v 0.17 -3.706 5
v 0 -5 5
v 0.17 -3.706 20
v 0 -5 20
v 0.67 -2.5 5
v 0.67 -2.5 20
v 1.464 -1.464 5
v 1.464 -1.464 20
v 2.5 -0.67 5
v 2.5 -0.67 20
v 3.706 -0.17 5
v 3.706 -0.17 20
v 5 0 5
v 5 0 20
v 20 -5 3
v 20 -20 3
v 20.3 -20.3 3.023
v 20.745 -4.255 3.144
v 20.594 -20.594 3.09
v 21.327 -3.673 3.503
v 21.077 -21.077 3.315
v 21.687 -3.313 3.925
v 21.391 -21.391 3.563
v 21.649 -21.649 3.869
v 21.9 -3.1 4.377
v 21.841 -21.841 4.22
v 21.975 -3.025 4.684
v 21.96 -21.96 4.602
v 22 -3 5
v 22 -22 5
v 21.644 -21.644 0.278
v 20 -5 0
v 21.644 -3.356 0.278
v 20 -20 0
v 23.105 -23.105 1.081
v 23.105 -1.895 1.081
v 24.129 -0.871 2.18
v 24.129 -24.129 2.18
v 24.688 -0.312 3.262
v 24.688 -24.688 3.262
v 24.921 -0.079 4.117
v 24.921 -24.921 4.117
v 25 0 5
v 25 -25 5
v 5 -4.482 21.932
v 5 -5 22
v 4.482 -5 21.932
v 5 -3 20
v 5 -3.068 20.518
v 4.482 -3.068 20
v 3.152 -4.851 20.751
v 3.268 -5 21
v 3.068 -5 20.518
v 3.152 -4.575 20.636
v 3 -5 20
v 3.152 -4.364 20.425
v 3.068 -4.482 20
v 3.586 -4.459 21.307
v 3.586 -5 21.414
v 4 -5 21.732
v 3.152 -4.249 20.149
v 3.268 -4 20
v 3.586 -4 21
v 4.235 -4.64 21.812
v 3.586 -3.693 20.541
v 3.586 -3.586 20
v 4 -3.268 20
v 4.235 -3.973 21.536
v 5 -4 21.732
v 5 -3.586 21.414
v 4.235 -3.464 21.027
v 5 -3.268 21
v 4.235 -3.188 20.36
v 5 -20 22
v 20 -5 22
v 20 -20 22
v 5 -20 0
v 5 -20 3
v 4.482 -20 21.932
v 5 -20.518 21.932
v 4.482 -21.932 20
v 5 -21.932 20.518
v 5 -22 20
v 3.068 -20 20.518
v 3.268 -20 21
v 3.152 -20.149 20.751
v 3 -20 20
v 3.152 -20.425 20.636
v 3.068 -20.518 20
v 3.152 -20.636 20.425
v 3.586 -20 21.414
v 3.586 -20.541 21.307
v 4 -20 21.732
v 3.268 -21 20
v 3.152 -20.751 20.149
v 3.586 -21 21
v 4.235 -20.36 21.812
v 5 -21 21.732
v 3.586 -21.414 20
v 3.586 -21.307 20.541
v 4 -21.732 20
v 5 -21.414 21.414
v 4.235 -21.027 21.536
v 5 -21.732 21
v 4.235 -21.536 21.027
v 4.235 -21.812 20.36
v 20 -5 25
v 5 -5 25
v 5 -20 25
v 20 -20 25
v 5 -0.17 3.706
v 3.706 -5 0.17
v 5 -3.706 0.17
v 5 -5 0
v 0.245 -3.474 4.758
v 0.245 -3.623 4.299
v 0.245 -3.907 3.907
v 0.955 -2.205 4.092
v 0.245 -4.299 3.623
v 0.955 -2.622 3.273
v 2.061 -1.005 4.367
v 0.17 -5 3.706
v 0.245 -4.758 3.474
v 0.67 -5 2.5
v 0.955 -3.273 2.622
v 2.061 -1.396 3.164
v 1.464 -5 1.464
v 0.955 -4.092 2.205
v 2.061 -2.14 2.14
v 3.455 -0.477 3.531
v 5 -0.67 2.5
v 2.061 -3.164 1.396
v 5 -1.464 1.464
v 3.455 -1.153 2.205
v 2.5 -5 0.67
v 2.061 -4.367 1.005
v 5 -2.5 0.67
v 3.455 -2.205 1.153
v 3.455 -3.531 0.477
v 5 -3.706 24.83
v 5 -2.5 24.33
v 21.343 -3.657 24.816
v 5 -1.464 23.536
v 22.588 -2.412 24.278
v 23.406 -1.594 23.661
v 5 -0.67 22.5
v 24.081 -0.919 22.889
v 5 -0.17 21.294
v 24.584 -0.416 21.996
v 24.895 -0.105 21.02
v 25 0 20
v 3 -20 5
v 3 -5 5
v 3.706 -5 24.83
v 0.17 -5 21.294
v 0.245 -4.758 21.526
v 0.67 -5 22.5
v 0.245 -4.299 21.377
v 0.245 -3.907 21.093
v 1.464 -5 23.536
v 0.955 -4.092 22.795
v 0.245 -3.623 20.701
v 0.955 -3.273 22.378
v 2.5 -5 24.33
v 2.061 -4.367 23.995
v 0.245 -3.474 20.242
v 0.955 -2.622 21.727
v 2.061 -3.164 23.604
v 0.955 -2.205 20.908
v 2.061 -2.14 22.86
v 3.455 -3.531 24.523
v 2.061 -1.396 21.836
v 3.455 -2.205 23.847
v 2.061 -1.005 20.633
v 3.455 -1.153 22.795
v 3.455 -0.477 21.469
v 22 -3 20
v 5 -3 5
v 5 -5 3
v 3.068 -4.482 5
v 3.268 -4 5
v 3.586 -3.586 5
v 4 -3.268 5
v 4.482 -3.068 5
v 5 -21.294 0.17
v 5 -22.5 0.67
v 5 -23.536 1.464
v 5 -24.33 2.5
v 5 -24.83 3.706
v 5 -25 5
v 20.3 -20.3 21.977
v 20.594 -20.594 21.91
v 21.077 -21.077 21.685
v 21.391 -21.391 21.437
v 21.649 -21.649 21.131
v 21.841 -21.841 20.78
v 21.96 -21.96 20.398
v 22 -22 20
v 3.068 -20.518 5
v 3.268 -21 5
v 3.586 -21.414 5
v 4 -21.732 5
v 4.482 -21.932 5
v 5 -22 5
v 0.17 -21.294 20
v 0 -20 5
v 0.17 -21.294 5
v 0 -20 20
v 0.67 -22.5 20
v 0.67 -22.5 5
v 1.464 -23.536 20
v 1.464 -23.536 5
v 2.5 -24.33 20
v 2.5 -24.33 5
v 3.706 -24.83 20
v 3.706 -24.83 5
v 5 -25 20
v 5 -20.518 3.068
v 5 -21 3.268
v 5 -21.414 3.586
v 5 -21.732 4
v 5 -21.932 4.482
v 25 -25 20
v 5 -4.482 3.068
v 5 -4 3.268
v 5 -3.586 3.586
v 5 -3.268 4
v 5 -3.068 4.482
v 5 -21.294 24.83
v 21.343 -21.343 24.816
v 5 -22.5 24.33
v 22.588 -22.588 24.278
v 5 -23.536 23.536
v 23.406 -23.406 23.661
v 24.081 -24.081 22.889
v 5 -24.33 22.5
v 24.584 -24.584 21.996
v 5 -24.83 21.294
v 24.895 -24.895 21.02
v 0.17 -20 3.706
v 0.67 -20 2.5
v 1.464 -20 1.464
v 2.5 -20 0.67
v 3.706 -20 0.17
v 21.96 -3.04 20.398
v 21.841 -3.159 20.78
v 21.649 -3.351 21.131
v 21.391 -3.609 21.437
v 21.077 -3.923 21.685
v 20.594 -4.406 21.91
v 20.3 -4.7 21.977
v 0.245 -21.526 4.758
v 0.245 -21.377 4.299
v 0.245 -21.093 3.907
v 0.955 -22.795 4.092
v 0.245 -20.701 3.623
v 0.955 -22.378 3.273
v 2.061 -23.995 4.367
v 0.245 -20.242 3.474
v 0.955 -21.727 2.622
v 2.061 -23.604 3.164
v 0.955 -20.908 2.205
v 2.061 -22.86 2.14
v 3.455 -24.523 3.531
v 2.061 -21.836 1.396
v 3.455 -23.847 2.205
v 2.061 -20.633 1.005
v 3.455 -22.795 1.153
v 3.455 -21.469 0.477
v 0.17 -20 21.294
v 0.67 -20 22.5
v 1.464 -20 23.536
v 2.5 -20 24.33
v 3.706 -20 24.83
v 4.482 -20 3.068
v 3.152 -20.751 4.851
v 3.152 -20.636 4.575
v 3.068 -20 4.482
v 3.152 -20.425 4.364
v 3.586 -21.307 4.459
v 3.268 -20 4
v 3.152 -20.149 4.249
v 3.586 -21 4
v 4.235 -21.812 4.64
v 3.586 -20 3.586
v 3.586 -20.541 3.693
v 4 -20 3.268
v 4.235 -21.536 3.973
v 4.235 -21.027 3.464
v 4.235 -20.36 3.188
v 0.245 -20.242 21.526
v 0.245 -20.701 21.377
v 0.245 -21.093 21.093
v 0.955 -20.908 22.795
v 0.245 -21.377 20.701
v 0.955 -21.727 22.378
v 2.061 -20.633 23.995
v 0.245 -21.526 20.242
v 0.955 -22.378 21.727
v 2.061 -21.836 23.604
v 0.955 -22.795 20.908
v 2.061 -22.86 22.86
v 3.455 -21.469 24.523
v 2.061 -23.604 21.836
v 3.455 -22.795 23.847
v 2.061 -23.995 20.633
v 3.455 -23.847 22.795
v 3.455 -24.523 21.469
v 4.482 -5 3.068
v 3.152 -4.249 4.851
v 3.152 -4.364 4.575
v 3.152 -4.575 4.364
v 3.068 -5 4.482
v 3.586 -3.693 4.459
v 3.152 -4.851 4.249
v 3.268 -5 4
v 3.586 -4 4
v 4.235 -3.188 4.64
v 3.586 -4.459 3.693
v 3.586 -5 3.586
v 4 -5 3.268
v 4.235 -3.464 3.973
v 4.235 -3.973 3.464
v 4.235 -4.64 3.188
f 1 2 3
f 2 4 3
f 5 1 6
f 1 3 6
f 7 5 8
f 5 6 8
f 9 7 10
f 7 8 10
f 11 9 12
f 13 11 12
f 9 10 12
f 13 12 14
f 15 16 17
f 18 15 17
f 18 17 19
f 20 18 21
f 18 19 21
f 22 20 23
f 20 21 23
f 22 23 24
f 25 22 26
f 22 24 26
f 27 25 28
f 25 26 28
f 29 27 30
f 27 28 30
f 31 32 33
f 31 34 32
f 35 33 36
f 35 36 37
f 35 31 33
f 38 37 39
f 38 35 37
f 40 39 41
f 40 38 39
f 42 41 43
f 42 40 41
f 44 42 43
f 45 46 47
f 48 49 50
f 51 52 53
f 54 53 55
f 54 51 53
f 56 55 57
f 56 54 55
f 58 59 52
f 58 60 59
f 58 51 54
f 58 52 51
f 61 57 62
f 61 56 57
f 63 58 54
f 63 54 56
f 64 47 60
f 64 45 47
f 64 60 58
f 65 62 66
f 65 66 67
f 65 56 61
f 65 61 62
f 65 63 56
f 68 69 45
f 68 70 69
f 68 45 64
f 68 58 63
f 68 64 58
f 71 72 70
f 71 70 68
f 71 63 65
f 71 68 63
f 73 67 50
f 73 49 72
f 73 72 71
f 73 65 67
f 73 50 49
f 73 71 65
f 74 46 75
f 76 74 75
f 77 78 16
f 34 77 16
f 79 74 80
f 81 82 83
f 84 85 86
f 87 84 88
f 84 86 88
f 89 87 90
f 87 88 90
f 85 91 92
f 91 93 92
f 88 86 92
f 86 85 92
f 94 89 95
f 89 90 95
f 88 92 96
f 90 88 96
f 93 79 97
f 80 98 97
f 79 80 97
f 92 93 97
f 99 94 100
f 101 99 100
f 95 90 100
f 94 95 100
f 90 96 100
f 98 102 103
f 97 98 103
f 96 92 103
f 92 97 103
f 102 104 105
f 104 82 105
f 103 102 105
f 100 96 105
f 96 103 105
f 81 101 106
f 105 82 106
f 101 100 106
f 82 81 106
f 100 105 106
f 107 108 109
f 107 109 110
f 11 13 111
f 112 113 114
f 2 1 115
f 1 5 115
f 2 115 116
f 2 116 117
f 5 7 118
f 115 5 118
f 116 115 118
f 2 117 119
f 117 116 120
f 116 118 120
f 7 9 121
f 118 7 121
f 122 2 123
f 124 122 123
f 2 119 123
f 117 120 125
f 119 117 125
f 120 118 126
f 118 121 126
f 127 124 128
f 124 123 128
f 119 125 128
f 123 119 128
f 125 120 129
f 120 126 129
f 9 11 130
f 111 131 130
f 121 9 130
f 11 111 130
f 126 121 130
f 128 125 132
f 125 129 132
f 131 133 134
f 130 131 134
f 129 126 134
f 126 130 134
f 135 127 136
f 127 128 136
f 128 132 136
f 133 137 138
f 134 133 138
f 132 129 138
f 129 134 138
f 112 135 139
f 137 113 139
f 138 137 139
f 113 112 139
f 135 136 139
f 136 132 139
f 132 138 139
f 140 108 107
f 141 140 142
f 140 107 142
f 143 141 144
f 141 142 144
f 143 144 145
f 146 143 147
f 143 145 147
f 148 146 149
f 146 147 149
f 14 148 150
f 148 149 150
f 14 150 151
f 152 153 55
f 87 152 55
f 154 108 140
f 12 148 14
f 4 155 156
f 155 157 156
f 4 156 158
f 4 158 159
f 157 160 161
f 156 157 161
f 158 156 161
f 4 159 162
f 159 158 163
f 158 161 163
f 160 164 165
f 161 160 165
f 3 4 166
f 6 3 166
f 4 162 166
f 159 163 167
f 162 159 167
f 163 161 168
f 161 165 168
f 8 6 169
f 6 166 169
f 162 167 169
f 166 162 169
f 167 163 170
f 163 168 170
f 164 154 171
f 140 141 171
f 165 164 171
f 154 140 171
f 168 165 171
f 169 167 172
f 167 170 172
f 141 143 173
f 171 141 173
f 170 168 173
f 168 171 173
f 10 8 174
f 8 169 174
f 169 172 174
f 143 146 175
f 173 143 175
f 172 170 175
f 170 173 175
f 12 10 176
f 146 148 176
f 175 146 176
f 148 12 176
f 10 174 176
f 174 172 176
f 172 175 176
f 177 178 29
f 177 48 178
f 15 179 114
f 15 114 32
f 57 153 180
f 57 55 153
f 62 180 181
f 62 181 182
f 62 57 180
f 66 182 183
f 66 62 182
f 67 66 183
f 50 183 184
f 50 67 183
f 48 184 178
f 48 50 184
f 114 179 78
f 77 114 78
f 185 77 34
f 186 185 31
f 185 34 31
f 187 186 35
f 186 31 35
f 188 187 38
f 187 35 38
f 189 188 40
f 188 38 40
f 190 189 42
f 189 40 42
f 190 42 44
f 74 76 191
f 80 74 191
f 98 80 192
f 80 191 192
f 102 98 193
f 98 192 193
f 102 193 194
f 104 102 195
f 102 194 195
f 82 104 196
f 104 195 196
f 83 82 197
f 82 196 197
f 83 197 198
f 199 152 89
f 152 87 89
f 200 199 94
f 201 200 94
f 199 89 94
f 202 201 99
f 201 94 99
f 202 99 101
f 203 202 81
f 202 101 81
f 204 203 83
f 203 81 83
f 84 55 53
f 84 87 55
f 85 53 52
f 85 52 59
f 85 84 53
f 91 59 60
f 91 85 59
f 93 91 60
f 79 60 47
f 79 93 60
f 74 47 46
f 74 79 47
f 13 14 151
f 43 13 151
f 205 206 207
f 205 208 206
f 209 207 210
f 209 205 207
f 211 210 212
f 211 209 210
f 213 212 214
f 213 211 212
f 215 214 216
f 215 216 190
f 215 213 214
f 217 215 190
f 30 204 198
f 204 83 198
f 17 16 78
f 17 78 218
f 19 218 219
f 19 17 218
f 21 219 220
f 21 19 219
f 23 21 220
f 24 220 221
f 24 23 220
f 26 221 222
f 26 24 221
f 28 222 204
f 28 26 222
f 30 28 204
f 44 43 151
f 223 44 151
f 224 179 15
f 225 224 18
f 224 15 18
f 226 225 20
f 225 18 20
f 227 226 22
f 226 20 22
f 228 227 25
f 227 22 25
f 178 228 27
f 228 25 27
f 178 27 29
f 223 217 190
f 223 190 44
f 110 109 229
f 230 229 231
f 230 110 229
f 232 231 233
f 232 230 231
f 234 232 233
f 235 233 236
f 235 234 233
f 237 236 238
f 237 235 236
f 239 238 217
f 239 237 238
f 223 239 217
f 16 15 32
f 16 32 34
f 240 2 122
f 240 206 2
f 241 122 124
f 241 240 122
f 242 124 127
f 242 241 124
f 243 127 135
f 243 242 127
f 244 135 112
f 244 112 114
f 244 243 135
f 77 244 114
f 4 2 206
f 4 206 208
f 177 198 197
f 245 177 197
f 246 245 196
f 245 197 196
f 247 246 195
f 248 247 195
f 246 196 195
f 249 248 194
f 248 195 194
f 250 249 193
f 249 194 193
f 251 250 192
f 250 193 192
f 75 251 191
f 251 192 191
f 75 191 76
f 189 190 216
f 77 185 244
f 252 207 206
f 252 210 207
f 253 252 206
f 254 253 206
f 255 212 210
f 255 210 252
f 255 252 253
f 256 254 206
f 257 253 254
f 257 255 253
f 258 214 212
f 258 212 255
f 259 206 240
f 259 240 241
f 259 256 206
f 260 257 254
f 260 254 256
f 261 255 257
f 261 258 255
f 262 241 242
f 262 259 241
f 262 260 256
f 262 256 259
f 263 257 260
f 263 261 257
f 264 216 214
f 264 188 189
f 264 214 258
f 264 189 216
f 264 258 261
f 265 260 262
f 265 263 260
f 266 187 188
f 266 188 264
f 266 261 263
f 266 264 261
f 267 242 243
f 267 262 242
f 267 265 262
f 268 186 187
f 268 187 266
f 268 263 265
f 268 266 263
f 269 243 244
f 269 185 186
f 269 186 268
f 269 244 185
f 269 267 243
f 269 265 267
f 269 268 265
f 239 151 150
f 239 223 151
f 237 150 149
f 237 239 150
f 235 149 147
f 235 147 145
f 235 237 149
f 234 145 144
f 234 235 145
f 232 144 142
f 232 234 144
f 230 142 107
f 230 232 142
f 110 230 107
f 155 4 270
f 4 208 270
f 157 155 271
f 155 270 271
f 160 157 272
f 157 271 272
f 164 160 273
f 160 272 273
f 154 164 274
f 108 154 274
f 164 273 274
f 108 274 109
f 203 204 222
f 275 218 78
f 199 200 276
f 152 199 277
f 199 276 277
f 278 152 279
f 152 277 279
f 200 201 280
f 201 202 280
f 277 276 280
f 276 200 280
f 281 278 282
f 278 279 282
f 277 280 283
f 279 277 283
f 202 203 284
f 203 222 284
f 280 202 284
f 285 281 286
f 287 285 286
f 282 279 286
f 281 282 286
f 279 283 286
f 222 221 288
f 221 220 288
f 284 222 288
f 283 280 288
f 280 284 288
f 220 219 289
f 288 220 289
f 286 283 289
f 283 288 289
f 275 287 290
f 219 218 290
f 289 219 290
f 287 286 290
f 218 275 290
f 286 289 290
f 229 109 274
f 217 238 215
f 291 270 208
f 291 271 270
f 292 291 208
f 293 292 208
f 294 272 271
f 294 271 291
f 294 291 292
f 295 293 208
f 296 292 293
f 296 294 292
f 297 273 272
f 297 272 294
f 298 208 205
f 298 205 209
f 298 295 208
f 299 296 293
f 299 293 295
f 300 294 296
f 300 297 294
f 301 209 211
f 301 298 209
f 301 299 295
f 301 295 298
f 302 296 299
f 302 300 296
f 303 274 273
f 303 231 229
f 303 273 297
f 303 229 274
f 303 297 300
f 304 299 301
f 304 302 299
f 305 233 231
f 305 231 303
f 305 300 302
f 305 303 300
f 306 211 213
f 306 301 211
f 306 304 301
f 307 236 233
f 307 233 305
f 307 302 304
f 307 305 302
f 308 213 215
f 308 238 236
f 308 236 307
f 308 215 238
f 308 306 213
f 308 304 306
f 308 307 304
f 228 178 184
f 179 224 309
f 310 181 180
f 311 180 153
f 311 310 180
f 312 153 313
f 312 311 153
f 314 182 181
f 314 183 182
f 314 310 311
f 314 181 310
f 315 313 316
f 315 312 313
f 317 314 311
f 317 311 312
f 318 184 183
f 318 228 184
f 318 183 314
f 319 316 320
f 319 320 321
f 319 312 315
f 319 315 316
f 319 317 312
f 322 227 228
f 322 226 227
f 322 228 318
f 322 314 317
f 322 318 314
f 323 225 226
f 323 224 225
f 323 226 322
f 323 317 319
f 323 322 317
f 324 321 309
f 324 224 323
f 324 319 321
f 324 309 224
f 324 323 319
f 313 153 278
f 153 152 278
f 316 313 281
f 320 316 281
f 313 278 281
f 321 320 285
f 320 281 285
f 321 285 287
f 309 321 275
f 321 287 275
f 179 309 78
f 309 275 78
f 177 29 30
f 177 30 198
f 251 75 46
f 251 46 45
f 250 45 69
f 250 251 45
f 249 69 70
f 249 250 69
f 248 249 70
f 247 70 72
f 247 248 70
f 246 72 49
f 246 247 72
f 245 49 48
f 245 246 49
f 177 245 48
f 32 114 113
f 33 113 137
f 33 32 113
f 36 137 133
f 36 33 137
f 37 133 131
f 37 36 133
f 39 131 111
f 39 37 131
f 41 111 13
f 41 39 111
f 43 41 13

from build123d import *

# Parameters (mm, degrees)
F0_W     = 25
F0_H     = 25
F1_DEPTH = 25
F2_R     = 5
F3_T     = -3


# Not quite as in the source:
# - a shell that OpenCascade refuses in one call is made with other operations: the cavity is built on its own and cut out


with BuildPart() as f1:
    # F0 (on Front) → F1 (new body)
    with BuildSketch(Plane.XZ):
        with Locations((12.5, 12.5)):
            Rectangle(F0_W, F0_H)
    extrude(amount=F1_DEPTH)

    # F2
    f2_edges = [f1.edges().sort_by_distance(p)[0] for p in [
        (12.5, 0, 0),
        (25, -12.5, 0),
        (25, -12.5, 25),
        (12.5, 0, 25),
        (12.5, -25, 25),
        (0, -12.5, 25),
        (12.5, -25, 0),
        (0, -25, 12.5),
        (0, 0, 12.5),
        (0, -12.5, 0),
    ]]
    fillet(f2_edges, radius=F2_R)

    # F3: a shell. OpenCascade refuses it in one call, so the cavity is built on its own and cut out:
    # the body offset inwards by the wall thickness, plus a prism from it out through each open face.
    f3_core = offset(f1.part, amount=F3_T, mode=Mode.PRIVATE)
    f3_exits = [f3_core.faces().sort_by_distance(p)[0] for p in [
        (12.5, -12.5, 3),
    ]]
    add(f3_core, mode=Mode.SUBTRACT)
    extrude(f3_exits, amount=-F3_T, mode=Mode.SUBTRACT)


solid = f1.part
